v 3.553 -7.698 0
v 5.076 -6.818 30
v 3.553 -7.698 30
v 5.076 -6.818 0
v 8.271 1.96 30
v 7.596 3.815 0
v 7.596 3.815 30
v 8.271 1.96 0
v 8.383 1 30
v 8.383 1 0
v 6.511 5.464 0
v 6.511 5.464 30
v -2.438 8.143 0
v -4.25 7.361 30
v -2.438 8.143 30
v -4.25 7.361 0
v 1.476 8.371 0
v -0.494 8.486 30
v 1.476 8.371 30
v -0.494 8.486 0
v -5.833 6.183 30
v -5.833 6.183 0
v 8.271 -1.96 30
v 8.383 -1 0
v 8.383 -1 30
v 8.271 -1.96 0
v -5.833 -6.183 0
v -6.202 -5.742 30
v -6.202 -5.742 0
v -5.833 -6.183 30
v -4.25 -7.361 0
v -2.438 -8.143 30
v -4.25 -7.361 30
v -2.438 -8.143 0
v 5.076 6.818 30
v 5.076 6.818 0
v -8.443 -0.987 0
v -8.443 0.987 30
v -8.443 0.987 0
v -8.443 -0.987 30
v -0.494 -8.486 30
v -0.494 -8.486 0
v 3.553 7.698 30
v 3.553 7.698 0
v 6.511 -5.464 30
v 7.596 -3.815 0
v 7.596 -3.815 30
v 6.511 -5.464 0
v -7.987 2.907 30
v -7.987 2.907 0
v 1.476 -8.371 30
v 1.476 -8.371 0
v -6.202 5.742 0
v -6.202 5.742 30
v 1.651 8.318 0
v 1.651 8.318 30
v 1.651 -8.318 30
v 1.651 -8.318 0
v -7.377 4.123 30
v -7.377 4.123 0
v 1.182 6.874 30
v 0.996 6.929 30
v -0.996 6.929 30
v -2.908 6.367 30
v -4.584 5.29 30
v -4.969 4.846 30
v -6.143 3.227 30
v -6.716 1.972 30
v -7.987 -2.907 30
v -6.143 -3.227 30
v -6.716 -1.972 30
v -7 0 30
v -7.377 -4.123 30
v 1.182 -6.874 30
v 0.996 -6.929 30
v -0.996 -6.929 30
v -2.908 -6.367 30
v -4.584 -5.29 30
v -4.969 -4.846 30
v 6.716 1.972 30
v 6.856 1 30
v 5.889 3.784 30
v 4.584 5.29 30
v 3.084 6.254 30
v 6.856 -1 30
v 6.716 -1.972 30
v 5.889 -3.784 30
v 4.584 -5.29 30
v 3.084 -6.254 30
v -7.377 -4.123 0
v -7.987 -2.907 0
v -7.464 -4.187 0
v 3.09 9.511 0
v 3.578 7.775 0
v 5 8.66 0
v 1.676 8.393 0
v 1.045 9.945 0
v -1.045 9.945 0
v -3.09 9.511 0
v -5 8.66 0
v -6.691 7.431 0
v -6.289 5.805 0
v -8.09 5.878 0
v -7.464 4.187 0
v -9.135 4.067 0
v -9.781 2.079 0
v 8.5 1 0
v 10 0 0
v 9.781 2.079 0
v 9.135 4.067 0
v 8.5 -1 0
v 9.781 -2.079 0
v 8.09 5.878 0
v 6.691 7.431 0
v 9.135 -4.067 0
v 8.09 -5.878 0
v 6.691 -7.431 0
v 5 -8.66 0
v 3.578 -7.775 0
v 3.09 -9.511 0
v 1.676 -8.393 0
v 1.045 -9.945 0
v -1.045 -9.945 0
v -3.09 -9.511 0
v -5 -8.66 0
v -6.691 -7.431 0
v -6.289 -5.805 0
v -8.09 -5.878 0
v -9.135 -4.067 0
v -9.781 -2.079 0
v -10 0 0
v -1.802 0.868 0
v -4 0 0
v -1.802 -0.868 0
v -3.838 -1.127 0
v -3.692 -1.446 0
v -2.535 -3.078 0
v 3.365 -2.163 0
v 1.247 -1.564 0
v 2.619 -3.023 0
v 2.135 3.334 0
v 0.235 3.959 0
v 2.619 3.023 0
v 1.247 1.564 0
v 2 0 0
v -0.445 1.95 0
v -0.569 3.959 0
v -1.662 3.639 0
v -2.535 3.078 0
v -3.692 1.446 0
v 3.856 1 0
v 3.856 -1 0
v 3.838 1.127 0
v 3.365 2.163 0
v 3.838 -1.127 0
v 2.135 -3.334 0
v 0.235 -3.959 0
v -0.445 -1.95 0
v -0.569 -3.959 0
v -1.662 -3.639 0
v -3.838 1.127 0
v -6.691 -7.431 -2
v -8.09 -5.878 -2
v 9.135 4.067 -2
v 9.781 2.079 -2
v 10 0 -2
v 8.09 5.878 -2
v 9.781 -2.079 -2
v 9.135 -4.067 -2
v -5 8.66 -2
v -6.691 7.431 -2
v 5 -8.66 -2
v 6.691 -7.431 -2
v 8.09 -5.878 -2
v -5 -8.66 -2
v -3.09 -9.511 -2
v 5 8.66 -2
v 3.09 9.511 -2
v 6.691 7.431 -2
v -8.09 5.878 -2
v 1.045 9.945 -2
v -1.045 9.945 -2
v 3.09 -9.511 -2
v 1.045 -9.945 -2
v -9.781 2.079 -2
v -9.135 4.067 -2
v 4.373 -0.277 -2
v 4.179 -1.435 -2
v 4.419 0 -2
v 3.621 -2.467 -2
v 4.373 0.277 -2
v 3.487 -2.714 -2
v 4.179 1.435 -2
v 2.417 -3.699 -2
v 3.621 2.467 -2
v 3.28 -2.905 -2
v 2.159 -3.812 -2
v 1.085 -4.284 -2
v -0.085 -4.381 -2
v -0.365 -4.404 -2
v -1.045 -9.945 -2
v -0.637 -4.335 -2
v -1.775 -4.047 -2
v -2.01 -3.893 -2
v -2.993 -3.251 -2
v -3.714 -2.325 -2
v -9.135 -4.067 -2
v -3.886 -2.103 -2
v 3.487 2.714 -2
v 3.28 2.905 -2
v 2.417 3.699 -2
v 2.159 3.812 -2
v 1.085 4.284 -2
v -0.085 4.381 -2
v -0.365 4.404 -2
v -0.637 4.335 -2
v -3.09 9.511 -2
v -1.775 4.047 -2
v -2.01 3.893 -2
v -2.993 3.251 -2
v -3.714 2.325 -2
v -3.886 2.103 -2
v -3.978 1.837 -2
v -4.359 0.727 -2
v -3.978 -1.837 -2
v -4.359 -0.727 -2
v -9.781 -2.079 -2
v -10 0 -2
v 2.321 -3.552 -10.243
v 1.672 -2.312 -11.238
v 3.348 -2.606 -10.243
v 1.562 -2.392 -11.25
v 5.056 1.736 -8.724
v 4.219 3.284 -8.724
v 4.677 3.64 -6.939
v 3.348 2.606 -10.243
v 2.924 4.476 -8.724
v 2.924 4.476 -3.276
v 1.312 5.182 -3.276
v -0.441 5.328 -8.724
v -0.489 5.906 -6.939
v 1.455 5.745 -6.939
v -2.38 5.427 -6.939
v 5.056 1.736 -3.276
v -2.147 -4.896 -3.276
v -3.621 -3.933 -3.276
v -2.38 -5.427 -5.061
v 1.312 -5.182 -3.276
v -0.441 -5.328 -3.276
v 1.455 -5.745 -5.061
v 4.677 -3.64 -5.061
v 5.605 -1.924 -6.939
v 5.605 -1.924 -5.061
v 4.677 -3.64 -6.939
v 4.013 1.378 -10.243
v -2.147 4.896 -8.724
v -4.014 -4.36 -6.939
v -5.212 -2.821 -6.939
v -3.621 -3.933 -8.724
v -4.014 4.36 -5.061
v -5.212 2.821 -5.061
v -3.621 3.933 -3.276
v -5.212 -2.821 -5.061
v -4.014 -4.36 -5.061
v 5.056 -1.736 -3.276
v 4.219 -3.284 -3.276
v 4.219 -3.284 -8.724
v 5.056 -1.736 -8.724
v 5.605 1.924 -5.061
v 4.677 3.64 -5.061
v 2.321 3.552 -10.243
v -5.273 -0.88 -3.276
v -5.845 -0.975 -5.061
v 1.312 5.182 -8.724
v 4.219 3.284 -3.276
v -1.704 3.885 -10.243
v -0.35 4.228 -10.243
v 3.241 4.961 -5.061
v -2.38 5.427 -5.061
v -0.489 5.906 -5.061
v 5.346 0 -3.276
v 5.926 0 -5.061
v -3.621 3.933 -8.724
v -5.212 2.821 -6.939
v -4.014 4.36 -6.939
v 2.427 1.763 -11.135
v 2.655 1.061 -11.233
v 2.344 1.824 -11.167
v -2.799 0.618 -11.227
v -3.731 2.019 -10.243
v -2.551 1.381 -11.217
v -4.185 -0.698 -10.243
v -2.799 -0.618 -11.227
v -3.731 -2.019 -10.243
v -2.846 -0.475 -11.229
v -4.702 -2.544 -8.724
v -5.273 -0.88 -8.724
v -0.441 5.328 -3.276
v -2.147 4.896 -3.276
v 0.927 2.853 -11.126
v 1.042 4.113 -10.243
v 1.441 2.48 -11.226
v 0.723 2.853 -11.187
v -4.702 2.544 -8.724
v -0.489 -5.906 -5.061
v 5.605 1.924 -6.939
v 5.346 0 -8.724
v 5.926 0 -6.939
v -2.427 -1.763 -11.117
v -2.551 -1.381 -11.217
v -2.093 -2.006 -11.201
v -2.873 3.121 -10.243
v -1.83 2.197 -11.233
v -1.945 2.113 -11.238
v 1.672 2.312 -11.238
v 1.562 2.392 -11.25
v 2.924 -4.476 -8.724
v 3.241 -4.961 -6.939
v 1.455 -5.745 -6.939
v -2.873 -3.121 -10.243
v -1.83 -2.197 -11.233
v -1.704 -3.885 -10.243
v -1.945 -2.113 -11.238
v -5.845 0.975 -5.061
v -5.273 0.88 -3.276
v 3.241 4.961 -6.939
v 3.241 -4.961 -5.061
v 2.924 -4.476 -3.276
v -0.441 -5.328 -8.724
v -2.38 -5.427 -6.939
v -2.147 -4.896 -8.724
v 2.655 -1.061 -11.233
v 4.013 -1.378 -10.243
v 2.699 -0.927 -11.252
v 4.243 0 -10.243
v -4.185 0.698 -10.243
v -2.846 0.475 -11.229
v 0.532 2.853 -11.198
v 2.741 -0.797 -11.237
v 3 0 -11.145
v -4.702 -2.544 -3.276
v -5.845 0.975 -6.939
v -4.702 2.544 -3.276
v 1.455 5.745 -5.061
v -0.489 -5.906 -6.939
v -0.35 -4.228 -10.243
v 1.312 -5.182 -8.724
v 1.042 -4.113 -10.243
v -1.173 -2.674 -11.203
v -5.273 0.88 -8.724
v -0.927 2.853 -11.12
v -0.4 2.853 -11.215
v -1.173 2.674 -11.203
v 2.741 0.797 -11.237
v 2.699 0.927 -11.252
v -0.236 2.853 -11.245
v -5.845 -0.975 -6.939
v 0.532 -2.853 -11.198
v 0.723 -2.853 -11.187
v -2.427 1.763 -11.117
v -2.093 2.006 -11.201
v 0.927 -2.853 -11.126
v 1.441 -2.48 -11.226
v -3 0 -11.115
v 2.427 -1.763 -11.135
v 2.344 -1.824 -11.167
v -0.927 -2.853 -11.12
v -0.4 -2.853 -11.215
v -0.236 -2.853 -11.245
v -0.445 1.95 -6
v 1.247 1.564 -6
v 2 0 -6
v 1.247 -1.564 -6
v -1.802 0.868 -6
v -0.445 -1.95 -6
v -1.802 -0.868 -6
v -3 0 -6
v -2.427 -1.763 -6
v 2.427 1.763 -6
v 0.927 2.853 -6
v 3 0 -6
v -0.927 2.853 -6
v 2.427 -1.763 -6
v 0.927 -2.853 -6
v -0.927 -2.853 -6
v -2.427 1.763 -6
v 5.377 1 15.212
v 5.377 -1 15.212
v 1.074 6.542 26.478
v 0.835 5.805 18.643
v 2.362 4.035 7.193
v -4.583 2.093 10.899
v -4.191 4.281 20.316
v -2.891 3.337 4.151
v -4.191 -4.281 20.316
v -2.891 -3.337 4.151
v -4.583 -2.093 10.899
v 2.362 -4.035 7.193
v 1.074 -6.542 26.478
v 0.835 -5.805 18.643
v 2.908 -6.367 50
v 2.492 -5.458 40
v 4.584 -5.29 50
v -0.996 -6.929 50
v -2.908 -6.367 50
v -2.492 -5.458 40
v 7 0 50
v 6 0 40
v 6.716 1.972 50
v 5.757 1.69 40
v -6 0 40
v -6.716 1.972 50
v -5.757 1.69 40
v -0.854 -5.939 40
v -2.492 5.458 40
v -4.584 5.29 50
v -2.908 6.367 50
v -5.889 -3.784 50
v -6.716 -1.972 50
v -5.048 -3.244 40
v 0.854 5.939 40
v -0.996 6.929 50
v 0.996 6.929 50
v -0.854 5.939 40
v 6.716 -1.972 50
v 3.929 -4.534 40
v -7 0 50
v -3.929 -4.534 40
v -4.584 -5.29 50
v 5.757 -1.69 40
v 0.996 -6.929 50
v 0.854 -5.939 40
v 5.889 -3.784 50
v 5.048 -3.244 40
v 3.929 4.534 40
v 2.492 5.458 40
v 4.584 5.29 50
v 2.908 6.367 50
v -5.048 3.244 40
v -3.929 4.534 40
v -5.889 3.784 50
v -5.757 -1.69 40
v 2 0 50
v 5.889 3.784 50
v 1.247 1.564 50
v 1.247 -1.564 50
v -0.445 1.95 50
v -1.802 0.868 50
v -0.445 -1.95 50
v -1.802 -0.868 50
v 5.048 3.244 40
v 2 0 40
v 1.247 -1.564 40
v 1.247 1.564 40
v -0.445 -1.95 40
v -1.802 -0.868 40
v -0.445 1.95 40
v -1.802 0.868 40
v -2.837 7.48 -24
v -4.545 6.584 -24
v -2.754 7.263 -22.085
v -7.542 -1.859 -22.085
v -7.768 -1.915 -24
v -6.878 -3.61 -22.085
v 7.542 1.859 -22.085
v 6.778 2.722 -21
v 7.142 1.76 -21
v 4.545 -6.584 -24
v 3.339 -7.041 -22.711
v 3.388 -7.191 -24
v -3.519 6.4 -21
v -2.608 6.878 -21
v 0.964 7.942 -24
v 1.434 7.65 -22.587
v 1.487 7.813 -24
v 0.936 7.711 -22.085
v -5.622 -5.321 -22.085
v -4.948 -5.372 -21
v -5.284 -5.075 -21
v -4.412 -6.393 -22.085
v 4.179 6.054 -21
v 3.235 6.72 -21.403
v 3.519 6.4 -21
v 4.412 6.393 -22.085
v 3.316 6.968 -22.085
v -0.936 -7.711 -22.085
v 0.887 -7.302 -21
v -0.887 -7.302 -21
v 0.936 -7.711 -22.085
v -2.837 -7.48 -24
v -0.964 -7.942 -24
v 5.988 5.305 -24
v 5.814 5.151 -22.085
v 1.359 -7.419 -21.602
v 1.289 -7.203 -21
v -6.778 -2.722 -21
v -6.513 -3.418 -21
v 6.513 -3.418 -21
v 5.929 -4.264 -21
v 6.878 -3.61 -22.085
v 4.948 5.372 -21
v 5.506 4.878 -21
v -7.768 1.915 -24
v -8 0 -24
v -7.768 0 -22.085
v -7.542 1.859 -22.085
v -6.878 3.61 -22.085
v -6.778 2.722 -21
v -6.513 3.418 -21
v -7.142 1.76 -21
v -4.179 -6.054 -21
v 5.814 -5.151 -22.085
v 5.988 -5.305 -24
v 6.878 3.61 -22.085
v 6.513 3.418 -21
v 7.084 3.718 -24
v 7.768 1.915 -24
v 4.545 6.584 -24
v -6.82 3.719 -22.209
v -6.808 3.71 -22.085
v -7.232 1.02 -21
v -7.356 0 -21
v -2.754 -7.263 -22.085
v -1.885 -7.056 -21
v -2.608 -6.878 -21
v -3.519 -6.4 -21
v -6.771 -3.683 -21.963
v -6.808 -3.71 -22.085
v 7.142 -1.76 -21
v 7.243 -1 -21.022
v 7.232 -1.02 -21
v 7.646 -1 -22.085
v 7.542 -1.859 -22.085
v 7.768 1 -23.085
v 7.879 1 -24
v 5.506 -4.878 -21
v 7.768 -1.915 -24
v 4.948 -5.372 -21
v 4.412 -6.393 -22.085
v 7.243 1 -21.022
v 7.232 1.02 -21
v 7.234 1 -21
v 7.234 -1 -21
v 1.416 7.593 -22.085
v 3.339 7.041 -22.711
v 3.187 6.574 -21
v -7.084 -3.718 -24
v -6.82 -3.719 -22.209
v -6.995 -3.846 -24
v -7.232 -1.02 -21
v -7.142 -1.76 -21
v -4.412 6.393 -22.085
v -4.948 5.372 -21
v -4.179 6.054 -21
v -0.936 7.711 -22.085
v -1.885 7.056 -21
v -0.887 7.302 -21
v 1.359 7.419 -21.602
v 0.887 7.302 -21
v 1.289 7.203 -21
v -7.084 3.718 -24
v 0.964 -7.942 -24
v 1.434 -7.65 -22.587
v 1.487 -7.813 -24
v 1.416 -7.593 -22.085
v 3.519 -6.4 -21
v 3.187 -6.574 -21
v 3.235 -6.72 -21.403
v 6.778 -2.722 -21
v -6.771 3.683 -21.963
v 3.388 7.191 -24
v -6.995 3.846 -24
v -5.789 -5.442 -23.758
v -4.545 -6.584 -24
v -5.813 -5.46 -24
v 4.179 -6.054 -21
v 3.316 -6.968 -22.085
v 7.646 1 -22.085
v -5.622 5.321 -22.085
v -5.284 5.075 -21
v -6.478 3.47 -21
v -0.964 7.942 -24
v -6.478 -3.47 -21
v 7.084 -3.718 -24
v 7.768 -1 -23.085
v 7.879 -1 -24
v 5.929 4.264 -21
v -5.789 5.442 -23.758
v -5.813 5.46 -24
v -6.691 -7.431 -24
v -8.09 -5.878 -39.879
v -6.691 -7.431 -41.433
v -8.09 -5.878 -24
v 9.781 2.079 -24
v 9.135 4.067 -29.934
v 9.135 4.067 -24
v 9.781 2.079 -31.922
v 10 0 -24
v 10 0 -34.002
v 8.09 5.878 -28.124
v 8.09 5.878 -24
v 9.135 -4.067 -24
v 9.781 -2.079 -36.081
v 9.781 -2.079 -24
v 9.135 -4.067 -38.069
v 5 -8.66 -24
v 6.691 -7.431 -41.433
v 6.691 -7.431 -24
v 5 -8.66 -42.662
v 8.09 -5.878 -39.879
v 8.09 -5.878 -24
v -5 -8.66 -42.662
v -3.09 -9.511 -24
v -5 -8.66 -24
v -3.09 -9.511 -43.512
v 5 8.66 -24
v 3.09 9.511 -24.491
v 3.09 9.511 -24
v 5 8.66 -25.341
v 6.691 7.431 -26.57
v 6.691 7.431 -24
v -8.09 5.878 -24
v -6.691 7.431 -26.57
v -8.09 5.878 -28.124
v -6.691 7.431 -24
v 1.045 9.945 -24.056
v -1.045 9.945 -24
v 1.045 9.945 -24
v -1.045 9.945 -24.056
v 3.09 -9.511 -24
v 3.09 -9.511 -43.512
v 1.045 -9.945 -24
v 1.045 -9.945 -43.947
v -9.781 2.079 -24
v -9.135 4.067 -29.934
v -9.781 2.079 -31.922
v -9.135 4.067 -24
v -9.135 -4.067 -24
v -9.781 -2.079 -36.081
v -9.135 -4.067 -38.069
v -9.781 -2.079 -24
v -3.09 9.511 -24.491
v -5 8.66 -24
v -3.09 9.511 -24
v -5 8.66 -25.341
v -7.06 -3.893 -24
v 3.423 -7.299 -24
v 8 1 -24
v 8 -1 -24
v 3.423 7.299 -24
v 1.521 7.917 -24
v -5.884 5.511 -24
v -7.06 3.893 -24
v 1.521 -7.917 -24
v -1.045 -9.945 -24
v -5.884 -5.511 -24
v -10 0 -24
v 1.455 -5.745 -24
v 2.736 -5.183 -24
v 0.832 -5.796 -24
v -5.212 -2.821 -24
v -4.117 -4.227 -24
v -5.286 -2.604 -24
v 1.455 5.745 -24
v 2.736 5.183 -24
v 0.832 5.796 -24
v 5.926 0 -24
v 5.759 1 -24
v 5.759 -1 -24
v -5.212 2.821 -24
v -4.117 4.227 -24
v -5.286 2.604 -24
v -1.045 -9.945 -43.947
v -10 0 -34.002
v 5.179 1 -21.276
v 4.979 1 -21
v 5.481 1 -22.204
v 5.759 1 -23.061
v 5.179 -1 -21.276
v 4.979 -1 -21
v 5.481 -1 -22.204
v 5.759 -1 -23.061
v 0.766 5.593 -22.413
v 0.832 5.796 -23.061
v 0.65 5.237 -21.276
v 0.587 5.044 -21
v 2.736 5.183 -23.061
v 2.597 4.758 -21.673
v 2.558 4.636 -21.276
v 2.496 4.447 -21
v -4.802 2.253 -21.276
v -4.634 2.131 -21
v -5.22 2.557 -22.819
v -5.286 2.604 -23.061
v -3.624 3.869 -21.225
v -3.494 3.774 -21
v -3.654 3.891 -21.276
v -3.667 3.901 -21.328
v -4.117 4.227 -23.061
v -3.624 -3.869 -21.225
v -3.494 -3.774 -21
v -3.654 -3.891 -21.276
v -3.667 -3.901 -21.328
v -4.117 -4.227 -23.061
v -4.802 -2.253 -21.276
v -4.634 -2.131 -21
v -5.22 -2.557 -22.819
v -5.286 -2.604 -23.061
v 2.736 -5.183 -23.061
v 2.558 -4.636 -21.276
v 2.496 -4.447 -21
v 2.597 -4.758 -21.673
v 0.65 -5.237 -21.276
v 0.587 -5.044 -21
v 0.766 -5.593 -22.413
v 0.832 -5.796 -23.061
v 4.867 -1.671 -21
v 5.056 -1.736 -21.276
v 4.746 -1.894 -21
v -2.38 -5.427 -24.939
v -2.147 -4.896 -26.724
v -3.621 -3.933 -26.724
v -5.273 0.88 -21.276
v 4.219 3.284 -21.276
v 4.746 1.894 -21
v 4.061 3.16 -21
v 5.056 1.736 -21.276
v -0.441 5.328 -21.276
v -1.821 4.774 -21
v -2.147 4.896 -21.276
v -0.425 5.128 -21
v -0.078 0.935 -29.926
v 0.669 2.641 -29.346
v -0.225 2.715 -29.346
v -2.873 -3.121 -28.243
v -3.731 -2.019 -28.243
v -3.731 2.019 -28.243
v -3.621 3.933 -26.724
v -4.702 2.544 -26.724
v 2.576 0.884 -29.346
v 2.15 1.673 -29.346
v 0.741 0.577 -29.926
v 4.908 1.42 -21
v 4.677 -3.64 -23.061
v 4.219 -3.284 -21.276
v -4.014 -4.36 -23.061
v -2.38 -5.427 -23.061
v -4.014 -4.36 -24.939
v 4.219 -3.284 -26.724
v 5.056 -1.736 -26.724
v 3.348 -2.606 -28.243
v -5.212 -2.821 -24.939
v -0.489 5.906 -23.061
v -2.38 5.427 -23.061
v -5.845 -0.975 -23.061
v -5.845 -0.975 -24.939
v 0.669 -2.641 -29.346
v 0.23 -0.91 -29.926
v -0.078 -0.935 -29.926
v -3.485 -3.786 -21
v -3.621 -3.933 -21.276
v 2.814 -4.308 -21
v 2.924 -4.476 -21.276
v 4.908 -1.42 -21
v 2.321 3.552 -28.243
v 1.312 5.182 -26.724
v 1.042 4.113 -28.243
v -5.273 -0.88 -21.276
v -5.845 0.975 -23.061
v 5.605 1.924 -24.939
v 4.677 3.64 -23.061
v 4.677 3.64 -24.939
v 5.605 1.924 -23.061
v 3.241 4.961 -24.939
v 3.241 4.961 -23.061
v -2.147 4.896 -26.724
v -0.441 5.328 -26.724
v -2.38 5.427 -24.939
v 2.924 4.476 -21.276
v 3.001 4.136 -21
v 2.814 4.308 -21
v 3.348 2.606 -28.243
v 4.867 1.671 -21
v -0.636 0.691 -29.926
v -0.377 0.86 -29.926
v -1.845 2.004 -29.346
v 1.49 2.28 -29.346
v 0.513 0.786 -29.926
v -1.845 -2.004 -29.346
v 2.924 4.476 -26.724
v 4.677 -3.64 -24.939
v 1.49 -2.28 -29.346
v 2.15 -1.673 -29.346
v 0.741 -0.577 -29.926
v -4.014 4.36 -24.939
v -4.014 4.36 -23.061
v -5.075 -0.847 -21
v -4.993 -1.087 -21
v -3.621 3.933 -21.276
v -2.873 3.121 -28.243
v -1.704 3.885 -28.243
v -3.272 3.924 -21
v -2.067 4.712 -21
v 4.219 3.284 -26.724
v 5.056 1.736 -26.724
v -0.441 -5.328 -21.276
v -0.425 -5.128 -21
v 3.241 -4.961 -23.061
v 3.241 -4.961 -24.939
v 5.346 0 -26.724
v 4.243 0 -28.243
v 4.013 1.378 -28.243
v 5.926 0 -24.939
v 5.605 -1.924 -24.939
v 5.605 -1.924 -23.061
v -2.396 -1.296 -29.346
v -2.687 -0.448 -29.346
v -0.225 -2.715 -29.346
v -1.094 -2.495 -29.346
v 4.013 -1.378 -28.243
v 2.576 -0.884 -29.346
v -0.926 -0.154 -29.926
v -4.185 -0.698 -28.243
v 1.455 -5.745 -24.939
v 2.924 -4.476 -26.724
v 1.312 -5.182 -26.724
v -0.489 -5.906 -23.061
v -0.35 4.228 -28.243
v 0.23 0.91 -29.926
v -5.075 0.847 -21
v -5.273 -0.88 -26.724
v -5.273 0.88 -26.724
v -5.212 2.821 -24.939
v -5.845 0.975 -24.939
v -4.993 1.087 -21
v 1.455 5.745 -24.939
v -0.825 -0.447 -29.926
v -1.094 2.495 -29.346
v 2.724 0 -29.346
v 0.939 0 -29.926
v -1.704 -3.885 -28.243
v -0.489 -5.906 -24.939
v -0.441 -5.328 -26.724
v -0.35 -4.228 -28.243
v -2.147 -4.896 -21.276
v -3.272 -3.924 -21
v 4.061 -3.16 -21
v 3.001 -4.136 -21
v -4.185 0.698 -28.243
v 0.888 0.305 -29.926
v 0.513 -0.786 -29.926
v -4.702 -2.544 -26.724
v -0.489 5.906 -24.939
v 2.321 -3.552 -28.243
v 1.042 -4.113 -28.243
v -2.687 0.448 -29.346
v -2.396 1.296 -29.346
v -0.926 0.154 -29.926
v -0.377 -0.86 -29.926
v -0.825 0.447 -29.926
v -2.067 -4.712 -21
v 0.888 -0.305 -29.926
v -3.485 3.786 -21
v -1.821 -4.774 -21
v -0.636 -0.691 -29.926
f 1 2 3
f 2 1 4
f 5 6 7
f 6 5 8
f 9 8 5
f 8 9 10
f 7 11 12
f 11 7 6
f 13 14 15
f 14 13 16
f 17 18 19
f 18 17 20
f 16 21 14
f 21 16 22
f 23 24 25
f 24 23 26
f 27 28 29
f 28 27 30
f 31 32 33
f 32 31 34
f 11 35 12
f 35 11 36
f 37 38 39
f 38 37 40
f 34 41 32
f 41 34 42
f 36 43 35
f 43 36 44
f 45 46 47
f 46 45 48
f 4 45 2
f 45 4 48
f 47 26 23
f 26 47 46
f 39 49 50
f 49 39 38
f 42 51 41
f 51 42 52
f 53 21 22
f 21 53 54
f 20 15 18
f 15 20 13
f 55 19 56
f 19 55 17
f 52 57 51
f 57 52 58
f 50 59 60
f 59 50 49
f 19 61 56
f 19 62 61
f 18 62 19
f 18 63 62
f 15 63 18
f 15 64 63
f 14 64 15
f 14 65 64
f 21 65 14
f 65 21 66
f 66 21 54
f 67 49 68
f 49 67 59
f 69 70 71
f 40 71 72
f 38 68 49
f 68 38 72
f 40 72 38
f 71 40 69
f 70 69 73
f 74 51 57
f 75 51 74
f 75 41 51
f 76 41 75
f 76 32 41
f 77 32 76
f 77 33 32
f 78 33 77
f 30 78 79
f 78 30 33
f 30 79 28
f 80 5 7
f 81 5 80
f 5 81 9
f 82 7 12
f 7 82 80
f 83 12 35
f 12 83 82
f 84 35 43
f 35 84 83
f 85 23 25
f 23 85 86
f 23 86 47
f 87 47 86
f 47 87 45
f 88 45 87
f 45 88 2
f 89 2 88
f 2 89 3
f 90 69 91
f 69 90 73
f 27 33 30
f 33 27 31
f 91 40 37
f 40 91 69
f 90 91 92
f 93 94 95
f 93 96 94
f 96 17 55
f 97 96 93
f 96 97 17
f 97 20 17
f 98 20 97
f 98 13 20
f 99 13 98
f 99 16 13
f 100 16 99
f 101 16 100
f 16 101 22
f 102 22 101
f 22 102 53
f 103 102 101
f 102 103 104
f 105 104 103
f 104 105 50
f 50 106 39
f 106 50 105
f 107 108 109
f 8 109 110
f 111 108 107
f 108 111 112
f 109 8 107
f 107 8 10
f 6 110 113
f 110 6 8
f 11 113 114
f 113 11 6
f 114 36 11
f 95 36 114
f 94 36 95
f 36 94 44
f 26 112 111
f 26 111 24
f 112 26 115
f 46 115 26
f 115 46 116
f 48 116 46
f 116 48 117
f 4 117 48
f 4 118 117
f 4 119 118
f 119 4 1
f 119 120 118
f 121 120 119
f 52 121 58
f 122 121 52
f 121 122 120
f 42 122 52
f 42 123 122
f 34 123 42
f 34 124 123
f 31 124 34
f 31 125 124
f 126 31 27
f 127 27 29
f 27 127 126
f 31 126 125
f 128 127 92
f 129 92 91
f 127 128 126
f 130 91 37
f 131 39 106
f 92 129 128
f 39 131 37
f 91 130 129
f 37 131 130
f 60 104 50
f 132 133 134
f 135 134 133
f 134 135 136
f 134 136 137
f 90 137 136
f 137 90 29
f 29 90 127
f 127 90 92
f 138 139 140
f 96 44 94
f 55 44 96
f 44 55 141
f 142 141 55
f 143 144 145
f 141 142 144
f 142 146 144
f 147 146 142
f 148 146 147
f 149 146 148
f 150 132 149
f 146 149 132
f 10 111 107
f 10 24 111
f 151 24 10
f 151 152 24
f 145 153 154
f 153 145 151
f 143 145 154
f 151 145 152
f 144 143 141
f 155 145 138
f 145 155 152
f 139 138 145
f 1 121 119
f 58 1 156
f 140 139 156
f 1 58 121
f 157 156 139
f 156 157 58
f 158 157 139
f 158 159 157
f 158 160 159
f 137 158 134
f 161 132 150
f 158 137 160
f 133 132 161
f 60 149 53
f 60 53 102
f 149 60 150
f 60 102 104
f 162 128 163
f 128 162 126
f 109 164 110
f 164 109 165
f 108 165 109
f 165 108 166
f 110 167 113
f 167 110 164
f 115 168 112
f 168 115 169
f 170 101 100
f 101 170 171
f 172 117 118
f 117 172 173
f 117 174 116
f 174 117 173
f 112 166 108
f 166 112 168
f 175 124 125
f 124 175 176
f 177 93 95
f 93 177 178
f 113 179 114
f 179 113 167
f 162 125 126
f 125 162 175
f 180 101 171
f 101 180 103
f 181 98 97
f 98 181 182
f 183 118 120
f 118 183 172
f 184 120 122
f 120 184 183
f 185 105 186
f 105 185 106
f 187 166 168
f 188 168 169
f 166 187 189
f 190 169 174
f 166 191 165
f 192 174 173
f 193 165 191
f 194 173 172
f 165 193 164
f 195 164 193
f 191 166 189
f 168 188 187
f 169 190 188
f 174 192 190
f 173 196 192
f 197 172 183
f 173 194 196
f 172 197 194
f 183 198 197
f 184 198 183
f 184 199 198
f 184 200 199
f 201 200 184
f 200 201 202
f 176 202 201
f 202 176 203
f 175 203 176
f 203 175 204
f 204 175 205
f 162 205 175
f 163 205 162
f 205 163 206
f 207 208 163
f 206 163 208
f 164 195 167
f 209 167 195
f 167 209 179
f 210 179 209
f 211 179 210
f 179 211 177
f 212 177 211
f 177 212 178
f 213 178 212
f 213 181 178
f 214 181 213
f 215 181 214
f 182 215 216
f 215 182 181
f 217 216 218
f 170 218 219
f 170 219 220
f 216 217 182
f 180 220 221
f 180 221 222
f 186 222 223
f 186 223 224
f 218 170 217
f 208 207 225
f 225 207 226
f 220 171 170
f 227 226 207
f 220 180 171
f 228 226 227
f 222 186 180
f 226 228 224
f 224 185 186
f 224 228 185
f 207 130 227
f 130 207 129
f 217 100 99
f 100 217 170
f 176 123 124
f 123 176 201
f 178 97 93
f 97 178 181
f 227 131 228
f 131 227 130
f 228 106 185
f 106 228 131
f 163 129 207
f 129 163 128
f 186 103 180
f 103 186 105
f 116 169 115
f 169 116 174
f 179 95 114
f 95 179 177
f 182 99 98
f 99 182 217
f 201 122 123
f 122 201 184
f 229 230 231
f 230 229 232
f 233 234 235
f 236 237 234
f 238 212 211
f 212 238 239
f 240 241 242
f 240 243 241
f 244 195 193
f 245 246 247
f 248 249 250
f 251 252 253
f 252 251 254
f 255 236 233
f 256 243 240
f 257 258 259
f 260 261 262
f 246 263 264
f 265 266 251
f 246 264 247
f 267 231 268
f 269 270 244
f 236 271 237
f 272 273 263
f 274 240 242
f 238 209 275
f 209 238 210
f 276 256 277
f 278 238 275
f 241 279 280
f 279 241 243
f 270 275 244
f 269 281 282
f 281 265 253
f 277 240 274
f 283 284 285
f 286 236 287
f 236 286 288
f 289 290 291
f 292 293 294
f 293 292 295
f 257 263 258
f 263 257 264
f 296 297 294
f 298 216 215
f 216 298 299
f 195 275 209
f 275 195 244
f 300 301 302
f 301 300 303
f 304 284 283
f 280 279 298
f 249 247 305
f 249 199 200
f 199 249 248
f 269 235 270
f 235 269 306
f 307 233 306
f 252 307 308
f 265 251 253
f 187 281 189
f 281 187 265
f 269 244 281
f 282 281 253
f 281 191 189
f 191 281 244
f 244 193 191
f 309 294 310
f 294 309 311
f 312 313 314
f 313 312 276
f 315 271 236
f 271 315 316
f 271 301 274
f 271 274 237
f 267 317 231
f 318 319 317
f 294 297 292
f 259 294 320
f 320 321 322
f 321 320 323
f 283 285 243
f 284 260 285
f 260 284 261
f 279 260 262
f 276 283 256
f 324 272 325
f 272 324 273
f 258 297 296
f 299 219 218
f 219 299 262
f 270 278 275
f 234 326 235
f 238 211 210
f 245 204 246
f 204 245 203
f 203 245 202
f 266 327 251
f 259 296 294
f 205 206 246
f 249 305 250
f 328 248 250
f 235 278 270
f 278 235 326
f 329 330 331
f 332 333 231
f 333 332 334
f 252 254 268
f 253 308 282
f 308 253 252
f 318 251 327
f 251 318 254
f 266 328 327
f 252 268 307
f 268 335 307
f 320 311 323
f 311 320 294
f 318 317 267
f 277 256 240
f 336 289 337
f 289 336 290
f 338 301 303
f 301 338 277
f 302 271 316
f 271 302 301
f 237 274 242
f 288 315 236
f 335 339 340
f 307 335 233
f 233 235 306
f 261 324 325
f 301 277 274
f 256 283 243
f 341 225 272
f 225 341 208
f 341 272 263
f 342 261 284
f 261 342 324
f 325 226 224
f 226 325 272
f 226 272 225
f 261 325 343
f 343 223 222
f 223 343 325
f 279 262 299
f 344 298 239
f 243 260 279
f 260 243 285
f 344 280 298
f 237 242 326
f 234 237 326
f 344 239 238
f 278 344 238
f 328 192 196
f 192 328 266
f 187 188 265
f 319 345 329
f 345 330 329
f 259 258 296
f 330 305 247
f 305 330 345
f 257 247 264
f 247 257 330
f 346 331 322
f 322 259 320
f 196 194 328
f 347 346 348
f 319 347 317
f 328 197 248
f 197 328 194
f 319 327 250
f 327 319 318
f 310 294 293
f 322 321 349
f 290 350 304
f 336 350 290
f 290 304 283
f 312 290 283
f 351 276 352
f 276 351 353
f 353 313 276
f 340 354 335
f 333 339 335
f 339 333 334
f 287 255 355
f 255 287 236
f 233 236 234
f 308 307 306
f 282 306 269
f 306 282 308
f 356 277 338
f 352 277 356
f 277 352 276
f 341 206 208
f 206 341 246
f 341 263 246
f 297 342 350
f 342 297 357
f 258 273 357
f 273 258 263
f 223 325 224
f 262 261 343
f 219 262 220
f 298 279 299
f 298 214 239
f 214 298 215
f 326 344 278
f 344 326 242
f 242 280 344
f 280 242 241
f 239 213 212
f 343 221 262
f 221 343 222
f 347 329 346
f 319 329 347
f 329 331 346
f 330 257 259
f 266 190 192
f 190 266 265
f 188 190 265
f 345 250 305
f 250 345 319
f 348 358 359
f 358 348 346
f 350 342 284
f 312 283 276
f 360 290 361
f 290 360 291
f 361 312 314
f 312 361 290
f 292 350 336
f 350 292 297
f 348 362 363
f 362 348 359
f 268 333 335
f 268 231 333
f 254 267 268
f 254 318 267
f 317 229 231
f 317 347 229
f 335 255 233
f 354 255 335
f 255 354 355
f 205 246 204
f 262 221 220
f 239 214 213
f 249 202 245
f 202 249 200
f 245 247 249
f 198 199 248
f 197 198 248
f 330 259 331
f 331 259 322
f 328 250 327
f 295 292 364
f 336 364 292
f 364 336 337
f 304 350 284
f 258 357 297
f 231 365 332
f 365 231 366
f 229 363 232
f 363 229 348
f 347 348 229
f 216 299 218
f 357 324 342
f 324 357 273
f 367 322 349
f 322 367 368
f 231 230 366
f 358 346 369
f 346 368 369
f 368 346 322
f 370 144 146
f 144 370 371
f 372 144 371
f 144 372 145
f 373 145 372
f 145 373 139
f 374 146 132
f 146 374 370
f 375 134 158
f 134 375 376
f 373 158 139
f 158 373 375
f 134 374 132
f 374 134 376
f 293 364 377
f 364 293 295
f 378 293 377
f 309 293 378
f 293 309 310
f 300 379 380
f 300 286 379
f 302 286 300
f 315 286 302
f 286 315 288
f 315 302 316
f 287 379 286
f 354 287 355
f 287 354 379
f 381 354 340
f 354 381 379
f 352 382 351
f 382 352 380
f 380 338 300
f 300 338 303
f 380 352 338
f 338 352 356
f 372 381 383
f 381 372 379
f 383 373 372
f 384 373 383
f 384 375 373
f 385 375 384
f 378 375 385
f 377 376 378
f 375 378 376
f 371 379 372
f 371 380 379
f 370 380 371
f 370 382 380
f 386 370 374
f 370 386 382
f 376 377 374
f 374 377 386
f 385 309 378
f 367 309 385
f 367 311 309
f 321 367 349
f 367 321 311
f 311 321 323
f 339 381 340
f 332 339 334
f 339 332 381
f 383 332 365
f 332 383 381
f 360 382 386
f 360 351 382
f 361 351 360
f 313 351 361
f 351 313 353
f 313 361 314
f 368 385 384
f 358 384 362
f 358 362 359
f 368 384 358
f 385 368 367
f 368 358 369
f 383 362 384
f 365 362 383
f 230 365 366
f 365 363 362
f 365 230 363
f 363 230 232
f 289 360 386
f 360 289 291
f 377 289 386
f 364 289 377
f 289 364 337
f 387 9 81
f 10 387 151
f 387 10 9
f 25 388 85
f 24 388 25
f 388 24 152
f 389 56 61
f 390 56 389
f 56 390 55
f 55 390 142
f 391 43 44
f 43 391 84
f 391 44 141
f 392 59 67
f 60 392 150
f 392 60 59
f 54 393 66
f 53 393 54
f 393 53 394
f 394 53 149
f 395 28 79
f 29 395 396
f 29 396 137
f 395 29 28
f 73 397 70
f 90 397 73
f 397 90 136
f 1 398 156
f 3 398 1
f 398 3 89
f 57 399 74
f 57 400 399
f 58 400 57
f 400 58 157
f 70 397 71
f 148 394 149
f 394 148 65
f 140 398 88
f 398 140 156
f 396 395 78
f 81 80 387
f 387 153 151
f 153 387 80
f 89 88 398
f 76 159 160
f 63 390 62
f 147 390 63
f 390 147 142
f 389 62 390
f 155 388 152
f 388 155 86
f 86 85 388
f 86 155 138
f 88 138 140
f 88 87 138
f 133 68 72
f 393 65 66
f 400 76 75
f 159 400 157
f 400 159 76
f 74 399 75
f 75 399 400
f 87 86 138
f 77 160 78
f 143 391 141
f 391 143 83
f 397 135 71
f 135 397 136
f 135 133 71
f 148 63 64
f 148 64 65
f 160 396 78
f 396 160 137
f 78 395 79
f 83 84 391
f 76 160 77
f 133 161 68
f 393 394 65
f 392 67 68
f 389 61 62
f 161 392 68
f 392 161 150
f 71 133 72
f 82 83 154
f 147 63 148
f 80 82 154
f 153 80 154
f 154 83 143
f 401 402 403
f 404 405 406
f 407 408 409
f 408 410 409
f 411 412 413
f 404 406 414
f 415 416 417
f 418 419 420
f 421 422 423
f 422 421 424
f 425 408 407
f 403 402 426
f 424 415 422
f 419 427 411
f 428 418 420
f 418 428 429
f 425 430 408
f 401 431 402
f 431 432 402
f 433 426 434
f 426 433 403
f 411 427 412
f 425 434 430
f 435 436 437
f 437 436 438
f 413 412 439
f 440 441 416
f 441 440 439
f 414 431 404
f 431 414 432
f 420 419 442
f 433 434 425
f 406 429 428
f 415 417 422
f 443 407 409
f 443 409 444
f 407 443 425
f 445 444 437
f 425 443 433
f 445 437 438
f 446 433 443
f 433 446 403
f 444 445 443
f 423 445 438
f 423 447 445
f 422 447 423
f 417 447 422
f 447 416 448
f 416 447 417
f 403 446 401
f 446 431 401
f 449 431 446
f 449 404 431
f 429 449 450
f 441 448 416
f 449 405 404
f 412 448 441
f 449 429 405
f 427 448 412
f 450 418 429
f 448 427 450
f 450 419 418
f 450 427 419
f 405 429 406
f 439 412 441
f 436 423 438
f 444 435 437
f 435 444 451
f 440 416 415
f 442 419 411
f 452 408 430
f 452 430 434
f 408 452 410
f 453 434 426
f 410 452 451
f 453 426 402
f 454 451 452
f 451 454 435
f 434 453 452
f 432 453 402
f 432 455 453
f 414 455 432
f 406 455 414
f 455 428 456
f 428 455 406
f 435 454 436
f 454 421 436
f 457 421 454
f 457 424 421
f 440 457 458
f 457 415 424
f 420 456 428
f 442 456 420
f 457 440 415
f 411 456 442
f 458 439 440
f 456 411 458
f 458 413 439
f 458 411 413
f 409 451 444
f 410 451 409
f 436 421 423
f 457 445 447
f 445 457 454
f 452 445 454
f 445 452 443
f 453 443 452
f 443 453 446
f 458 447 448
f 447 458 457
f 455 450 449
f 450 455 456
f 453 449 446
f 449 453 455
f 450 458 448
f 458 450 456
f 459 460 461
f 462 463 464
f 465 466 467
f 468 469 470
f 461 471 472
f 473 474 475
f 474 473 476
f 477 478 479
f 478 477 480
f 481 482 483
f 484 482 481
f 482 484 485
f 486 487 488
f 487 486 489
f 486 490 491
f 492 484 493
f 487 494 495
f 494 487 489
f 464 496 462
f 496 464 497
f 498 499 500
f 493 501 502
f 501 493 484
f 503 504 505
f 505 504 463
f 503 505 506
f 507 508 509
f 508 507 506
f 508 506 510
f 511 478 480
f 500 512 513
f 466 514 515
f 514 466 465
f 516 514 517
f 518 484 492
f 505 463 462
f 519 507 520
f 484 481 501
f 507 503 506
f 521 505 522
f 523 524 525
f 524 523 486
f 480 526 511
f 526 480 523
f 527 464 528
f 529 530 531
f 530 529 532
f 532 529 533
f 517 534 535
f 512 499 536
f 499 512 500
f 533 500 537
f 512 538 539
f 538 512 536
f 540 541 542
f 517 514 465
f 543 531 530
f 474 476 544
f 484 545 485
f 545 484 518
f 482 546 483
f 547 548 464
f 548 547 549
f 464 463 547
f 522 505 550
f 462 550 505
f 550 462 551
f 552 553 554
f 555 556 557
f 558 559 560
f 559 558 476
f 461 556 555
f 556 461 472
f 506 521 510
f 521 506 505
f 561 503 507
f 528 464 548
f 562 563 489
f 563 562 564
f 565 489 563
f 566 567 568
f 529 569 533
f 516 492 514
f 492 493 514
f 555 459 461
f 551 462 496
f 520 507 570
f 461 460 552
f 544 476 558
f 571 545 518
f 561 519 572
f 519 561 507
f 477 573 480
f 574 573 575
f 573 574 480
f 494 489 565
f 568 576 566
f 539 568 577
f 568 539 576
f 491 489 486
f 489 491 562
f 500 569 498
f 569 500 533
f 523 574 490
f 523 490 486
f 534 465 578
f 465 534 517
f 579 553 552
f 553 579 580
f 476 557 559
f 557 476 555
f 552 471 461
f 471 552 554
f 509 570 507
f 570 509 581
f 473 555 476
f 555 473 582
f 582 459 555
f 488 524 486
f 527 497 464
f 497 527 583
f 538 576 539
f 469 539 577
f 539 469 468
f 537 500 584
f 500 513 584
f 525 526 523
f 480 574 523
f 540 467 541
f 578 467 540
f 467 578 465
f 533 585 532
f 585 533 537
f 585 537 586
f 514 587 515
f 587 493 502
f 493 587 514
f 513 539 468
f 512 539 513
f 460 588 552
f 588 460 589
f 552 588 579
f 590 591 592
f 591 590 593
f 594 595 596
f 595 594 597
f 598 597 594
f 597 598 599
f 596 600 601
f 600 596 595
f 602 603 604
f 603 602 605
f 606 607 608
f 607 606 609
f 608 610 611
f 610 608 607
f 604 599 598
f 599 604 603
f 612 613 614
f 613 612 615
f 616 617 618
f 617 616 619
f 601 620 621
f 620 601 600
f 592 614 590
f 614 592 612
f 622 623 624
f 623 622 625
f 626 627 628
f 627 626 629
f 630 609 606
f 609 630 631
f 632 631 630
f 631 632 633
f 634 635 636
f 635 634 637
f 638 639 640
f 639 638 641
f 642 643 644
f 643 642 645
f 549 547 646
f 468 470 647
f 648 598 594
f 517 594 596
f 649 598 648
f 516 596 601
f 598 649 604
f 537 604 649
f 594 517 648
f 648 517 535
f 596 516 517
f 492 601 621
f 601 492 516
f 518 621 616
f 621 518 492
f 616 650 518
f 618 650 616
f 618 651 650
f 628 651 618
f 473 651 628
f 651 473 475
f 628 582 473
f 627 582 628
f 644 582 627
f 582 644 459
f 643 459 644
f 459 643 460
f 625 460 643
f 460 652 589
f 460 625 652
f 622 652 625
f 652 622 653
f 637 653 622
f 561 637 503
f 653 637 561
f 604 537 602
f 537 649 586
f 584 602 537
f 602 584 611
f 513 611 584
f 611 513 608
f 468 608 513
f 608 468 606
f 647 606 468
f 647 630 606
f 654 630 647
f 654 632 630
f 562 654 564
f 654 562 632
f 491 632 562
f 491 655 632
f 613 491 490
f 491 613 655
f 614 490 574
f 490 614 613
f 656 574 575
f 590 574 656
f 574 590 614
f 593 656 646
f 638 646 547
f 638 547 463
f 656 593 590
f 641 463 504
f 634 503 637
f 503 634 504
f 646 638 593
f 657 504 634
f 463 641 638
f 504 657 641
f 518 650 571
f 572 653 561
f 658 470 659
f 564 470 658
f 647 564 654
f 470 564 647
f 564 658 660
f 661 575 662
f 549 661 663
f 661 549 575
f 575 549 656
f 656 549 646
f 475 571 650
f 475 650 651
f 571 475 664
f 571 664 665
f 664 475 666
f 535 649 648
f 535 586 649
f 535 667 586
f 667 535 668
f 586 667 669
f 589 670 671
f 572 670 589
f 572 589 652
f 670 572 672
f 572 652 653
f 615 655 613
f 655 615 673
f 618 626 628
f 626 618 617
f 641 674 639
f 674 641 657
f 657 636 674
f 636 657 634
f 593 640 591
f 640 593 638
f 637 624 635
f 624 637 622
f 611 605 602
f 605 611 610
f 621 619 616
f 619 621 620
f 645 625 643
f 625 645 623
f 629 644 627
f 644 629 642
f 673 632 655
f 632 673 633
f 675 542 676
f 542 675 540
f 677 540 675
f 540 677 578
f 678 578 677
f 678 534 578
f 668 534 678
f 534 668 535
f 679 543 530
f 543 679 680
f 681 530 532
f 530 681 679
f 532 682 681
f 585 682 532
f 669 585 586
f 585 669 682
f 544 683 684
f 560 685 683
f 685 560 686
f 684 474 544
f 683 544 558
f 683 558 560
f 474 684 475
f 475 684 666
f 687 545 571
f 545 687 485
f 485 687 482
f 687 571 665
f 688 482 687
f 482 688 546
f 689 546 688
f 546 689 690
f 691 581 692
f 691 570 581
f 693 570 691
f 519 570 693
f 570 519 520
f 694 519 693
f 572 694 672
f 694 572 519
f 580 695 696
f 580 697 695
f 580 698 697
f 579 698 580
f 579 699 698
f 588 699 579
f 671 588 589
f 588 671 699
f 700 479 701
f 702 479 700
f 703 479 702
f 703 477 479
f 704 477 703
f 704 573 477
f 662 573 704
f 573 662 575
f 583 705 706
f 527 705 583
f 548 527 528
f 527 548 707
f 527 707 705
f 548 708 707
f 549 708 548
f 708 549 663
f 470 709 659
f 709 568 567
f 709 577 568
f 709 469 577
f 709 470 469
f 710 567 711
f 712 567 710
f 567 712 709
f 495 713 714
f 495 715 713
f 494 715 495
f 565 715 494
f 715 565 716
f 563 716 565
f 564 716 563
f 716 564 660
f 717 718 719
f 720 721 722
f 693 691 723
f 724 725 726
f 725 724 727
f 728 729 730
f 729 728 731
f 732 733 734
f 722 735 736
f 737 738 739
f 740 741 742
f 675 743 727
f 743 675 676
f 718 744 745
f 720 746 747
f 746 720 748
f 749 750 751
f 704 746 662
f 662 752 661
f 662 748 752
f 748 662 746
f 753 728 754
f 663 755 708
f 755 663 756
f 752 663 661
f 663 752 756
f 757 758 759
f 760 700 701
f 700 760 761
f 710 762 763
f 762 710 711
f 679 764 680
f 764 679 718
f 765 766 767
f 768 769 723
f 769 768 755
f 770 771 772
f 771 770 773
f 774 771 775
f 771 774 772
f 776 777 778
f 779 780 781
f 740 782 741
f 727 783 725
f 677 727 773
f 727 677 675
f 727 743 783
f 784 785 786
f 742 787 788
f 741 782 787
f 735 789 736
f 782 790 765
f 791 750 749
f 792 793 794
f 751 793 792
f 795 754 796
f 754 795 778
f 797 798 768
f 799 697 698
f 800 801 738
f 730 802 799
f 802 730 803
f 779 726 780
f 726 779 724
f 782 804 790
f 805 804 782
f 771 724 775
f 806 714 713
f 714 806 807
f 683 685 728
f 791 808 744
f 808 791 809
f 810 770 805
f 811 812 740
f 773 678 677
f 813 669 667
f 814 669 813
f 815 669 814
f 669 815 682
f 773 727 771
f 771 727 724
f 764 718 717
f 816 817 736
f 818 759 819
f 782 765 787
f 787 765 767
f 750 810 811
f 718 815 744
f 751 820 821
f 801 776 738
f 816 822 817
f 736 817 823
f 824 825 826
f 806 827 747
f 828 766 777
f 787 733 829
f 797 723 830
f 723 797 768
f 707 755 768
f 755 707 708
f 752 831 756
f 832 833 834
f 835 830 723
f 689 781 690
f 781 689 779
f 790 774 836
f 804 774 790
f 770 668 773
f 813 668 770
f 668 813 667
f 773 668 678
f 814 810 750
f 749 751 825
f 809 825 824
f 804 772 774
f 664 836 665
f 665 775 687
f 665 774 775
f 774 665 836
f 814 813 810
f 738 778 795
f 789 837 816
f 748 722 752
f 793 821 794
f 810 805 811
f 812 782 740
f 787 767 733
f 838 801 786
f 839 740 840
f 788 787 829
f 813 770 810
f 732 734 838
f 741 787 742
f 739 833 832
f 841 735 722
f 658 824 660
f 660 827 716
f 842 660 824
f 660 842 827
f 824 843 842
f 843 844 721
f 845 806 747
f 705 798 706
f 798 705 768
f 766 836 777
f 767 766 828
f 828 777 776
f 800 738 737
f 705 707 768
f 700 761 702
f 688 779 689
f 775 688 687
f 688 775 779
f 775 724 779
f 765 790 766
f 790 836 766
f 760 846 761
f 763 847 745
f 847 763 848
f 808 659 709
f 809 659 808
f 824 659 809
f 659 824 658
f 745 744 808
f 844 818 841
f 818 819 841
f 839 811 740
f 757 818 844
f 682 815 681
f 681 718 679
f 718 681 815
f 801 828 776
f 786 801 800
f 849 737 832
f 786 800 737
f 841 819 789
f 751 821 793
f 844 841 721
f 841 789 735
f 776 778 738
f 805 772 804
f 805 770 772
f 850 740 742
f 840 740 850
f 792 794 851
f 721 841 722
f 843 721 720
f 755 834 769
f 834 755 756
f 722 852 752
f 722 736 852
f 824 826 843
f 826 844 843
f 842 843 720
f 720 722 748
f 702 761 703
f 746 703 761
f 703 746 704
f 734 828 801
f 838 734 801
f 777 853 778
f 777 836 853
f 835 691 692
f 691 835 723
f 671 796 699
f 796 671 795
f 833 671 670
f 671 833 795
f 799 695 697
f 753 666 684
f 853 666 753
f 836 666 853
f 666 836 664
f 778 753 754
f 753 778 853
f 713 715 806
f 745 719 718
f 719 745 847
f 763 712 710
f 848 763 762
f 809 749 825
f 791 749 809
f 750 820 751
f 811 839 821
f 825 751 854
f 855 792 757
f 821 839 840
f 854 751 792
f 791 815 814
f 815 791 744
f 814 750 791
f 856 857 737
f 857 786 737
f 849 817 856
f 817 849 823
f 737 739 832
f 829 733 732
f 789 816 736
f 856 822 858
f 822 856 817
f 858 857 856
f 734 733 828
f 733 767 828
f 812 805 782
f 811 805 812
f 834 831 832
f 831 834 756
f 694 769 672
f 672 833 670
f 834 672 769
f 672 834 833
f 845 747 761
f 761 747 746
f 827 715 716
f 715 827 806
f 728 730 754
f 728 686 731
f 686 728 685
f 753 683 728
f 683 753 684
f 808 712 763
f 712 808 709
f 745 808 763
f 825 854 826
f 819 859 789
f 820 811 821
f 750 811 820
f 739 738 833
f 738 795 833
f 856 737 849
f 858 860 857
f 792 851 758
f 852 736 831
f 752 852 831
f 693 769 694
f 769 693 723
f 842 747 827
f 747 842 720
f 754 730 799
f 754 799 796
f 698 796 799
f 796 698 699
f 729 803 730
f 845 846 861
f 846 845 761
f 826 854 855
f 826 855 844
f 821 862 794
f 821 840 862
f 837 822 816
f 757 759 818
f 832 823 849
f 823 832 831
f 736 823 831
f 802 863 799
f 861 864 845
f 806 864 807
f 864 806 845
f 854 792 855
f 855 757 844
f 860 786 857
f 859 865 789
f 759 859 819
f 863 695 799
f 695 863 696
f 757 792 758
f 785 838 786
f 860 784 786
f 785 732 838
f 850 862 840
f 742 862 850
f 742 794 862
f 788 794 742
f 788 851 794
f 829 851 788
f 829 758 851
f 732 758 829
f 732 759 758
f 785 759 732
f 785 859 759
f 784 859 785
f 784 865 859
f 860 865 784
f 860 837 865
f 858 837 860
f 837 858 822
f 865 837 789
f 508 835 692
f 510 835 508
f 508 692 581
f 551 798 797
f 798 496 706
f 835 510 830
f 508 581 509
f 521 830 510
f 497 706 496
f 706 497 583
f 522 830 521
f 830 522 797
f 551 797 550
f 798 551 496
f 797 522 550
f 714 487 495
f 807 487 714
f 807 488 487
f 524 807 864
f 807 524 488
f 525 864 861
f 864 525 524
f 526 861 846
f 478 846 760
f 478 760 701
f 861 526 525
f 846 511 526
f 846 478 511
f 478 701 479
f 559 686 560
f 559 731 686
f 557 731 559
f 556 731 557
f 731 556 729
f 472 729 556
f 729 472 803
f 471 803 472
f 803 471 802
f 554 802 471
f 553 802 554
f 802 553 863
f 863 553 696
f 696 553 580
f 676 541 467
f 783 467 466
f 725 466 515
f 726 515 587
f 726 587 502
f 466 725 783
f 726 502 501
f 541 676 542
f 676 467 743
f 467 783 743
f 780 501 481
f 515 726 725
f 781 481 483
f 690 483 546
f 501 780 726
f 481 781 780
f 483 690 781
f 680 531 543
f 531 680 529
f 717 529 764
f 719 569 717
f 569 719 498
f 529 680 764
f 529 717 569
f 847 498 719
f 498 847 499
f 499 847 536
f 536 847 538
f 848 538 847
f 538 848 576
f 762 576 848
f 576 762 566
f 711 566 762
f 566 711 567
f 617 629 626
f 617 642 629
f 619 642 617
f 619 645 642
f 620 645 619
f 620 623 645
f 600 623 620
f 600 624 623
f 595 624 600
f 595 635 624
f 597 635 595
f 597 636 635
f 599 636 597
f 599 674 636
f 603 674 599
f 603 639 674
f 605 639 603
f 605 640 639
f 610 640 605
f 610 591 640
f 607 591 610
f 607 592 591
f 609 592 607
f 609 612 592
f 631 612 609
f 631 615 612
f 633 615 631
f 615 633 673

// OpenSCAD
// handlebar_mirror.scad
// sizes should be in mm, I hope.

ball_rad = 6;
bar_irad = 8.5;
bar_orad = 10;
bar_depth = 30;
mount_length = 2;
slits_n = 5;
screw_rad = 2;

// bar insert
difference(){
	union(){
		cylinder(r=bar_irad, h=bar_depth);
		translate([0,0,-2])
		cylinder(r=bar_orad,h=2);				// bar-end cap
		translate([0,0,-ball_rad])
		sphere(r=ball_rad);					// ball
	}
	cylinder(r1=4, r2=7, h=bar_depth);		// tapered hole
	translate([0,0,-2*ball_rad]){
		cylinder(r=screw_rad, h=2*ball_rad);	// screw hole
		cylinder(r=3, h=ball_rad);			// counter sink
	}
	slits(slits_n,bar_irad,bar_depth);
}

// expander plug
translate([0,0,4/3*bar_depth])
difference(){
	cylinder(r1=6, r2=7, h=bar_depth/3);
	cylinder(r=screw_rad, h=bar_depth/3);
}

// socket
//mirror([0,0,1]) translate([2*bar_orad,0,-.414*bar_orad]) rotate(a=135,v=[1,0,0])
translate([0,0,-4*ball_rad])
difference(){
	union(){
		sphere(r=2+ball_rad);				// socket
		translate([0,0,-mount_length*(4+ball_rad)])
		cylinder(r=bar_orad,h=mount_length*bar_orad);	// mirror mount
	}
	sphere(r=ball_rad);						// socket
	translate([0,0,ball_rad])
	cube([3*ball_rad,3*ball_rad,ball_rad],
		center=true);
	slits(slits_n,2+ball_rad,ball_rad);
	translate([0,0,-mount_length*bar_orad])
	rotate(a=45,v=[1,0,0])
	cube([2*bar_orad,5*bar_orad,1.414*bar_orad], center=true);
}


module slits(n, r, d){				// n cuts
	for(i = [0:n-1]){
		rotate(a=i*360/n,v=[0,0,1])
		translate([0,-1,0])
		cube([r,2,d]);
	}
}
